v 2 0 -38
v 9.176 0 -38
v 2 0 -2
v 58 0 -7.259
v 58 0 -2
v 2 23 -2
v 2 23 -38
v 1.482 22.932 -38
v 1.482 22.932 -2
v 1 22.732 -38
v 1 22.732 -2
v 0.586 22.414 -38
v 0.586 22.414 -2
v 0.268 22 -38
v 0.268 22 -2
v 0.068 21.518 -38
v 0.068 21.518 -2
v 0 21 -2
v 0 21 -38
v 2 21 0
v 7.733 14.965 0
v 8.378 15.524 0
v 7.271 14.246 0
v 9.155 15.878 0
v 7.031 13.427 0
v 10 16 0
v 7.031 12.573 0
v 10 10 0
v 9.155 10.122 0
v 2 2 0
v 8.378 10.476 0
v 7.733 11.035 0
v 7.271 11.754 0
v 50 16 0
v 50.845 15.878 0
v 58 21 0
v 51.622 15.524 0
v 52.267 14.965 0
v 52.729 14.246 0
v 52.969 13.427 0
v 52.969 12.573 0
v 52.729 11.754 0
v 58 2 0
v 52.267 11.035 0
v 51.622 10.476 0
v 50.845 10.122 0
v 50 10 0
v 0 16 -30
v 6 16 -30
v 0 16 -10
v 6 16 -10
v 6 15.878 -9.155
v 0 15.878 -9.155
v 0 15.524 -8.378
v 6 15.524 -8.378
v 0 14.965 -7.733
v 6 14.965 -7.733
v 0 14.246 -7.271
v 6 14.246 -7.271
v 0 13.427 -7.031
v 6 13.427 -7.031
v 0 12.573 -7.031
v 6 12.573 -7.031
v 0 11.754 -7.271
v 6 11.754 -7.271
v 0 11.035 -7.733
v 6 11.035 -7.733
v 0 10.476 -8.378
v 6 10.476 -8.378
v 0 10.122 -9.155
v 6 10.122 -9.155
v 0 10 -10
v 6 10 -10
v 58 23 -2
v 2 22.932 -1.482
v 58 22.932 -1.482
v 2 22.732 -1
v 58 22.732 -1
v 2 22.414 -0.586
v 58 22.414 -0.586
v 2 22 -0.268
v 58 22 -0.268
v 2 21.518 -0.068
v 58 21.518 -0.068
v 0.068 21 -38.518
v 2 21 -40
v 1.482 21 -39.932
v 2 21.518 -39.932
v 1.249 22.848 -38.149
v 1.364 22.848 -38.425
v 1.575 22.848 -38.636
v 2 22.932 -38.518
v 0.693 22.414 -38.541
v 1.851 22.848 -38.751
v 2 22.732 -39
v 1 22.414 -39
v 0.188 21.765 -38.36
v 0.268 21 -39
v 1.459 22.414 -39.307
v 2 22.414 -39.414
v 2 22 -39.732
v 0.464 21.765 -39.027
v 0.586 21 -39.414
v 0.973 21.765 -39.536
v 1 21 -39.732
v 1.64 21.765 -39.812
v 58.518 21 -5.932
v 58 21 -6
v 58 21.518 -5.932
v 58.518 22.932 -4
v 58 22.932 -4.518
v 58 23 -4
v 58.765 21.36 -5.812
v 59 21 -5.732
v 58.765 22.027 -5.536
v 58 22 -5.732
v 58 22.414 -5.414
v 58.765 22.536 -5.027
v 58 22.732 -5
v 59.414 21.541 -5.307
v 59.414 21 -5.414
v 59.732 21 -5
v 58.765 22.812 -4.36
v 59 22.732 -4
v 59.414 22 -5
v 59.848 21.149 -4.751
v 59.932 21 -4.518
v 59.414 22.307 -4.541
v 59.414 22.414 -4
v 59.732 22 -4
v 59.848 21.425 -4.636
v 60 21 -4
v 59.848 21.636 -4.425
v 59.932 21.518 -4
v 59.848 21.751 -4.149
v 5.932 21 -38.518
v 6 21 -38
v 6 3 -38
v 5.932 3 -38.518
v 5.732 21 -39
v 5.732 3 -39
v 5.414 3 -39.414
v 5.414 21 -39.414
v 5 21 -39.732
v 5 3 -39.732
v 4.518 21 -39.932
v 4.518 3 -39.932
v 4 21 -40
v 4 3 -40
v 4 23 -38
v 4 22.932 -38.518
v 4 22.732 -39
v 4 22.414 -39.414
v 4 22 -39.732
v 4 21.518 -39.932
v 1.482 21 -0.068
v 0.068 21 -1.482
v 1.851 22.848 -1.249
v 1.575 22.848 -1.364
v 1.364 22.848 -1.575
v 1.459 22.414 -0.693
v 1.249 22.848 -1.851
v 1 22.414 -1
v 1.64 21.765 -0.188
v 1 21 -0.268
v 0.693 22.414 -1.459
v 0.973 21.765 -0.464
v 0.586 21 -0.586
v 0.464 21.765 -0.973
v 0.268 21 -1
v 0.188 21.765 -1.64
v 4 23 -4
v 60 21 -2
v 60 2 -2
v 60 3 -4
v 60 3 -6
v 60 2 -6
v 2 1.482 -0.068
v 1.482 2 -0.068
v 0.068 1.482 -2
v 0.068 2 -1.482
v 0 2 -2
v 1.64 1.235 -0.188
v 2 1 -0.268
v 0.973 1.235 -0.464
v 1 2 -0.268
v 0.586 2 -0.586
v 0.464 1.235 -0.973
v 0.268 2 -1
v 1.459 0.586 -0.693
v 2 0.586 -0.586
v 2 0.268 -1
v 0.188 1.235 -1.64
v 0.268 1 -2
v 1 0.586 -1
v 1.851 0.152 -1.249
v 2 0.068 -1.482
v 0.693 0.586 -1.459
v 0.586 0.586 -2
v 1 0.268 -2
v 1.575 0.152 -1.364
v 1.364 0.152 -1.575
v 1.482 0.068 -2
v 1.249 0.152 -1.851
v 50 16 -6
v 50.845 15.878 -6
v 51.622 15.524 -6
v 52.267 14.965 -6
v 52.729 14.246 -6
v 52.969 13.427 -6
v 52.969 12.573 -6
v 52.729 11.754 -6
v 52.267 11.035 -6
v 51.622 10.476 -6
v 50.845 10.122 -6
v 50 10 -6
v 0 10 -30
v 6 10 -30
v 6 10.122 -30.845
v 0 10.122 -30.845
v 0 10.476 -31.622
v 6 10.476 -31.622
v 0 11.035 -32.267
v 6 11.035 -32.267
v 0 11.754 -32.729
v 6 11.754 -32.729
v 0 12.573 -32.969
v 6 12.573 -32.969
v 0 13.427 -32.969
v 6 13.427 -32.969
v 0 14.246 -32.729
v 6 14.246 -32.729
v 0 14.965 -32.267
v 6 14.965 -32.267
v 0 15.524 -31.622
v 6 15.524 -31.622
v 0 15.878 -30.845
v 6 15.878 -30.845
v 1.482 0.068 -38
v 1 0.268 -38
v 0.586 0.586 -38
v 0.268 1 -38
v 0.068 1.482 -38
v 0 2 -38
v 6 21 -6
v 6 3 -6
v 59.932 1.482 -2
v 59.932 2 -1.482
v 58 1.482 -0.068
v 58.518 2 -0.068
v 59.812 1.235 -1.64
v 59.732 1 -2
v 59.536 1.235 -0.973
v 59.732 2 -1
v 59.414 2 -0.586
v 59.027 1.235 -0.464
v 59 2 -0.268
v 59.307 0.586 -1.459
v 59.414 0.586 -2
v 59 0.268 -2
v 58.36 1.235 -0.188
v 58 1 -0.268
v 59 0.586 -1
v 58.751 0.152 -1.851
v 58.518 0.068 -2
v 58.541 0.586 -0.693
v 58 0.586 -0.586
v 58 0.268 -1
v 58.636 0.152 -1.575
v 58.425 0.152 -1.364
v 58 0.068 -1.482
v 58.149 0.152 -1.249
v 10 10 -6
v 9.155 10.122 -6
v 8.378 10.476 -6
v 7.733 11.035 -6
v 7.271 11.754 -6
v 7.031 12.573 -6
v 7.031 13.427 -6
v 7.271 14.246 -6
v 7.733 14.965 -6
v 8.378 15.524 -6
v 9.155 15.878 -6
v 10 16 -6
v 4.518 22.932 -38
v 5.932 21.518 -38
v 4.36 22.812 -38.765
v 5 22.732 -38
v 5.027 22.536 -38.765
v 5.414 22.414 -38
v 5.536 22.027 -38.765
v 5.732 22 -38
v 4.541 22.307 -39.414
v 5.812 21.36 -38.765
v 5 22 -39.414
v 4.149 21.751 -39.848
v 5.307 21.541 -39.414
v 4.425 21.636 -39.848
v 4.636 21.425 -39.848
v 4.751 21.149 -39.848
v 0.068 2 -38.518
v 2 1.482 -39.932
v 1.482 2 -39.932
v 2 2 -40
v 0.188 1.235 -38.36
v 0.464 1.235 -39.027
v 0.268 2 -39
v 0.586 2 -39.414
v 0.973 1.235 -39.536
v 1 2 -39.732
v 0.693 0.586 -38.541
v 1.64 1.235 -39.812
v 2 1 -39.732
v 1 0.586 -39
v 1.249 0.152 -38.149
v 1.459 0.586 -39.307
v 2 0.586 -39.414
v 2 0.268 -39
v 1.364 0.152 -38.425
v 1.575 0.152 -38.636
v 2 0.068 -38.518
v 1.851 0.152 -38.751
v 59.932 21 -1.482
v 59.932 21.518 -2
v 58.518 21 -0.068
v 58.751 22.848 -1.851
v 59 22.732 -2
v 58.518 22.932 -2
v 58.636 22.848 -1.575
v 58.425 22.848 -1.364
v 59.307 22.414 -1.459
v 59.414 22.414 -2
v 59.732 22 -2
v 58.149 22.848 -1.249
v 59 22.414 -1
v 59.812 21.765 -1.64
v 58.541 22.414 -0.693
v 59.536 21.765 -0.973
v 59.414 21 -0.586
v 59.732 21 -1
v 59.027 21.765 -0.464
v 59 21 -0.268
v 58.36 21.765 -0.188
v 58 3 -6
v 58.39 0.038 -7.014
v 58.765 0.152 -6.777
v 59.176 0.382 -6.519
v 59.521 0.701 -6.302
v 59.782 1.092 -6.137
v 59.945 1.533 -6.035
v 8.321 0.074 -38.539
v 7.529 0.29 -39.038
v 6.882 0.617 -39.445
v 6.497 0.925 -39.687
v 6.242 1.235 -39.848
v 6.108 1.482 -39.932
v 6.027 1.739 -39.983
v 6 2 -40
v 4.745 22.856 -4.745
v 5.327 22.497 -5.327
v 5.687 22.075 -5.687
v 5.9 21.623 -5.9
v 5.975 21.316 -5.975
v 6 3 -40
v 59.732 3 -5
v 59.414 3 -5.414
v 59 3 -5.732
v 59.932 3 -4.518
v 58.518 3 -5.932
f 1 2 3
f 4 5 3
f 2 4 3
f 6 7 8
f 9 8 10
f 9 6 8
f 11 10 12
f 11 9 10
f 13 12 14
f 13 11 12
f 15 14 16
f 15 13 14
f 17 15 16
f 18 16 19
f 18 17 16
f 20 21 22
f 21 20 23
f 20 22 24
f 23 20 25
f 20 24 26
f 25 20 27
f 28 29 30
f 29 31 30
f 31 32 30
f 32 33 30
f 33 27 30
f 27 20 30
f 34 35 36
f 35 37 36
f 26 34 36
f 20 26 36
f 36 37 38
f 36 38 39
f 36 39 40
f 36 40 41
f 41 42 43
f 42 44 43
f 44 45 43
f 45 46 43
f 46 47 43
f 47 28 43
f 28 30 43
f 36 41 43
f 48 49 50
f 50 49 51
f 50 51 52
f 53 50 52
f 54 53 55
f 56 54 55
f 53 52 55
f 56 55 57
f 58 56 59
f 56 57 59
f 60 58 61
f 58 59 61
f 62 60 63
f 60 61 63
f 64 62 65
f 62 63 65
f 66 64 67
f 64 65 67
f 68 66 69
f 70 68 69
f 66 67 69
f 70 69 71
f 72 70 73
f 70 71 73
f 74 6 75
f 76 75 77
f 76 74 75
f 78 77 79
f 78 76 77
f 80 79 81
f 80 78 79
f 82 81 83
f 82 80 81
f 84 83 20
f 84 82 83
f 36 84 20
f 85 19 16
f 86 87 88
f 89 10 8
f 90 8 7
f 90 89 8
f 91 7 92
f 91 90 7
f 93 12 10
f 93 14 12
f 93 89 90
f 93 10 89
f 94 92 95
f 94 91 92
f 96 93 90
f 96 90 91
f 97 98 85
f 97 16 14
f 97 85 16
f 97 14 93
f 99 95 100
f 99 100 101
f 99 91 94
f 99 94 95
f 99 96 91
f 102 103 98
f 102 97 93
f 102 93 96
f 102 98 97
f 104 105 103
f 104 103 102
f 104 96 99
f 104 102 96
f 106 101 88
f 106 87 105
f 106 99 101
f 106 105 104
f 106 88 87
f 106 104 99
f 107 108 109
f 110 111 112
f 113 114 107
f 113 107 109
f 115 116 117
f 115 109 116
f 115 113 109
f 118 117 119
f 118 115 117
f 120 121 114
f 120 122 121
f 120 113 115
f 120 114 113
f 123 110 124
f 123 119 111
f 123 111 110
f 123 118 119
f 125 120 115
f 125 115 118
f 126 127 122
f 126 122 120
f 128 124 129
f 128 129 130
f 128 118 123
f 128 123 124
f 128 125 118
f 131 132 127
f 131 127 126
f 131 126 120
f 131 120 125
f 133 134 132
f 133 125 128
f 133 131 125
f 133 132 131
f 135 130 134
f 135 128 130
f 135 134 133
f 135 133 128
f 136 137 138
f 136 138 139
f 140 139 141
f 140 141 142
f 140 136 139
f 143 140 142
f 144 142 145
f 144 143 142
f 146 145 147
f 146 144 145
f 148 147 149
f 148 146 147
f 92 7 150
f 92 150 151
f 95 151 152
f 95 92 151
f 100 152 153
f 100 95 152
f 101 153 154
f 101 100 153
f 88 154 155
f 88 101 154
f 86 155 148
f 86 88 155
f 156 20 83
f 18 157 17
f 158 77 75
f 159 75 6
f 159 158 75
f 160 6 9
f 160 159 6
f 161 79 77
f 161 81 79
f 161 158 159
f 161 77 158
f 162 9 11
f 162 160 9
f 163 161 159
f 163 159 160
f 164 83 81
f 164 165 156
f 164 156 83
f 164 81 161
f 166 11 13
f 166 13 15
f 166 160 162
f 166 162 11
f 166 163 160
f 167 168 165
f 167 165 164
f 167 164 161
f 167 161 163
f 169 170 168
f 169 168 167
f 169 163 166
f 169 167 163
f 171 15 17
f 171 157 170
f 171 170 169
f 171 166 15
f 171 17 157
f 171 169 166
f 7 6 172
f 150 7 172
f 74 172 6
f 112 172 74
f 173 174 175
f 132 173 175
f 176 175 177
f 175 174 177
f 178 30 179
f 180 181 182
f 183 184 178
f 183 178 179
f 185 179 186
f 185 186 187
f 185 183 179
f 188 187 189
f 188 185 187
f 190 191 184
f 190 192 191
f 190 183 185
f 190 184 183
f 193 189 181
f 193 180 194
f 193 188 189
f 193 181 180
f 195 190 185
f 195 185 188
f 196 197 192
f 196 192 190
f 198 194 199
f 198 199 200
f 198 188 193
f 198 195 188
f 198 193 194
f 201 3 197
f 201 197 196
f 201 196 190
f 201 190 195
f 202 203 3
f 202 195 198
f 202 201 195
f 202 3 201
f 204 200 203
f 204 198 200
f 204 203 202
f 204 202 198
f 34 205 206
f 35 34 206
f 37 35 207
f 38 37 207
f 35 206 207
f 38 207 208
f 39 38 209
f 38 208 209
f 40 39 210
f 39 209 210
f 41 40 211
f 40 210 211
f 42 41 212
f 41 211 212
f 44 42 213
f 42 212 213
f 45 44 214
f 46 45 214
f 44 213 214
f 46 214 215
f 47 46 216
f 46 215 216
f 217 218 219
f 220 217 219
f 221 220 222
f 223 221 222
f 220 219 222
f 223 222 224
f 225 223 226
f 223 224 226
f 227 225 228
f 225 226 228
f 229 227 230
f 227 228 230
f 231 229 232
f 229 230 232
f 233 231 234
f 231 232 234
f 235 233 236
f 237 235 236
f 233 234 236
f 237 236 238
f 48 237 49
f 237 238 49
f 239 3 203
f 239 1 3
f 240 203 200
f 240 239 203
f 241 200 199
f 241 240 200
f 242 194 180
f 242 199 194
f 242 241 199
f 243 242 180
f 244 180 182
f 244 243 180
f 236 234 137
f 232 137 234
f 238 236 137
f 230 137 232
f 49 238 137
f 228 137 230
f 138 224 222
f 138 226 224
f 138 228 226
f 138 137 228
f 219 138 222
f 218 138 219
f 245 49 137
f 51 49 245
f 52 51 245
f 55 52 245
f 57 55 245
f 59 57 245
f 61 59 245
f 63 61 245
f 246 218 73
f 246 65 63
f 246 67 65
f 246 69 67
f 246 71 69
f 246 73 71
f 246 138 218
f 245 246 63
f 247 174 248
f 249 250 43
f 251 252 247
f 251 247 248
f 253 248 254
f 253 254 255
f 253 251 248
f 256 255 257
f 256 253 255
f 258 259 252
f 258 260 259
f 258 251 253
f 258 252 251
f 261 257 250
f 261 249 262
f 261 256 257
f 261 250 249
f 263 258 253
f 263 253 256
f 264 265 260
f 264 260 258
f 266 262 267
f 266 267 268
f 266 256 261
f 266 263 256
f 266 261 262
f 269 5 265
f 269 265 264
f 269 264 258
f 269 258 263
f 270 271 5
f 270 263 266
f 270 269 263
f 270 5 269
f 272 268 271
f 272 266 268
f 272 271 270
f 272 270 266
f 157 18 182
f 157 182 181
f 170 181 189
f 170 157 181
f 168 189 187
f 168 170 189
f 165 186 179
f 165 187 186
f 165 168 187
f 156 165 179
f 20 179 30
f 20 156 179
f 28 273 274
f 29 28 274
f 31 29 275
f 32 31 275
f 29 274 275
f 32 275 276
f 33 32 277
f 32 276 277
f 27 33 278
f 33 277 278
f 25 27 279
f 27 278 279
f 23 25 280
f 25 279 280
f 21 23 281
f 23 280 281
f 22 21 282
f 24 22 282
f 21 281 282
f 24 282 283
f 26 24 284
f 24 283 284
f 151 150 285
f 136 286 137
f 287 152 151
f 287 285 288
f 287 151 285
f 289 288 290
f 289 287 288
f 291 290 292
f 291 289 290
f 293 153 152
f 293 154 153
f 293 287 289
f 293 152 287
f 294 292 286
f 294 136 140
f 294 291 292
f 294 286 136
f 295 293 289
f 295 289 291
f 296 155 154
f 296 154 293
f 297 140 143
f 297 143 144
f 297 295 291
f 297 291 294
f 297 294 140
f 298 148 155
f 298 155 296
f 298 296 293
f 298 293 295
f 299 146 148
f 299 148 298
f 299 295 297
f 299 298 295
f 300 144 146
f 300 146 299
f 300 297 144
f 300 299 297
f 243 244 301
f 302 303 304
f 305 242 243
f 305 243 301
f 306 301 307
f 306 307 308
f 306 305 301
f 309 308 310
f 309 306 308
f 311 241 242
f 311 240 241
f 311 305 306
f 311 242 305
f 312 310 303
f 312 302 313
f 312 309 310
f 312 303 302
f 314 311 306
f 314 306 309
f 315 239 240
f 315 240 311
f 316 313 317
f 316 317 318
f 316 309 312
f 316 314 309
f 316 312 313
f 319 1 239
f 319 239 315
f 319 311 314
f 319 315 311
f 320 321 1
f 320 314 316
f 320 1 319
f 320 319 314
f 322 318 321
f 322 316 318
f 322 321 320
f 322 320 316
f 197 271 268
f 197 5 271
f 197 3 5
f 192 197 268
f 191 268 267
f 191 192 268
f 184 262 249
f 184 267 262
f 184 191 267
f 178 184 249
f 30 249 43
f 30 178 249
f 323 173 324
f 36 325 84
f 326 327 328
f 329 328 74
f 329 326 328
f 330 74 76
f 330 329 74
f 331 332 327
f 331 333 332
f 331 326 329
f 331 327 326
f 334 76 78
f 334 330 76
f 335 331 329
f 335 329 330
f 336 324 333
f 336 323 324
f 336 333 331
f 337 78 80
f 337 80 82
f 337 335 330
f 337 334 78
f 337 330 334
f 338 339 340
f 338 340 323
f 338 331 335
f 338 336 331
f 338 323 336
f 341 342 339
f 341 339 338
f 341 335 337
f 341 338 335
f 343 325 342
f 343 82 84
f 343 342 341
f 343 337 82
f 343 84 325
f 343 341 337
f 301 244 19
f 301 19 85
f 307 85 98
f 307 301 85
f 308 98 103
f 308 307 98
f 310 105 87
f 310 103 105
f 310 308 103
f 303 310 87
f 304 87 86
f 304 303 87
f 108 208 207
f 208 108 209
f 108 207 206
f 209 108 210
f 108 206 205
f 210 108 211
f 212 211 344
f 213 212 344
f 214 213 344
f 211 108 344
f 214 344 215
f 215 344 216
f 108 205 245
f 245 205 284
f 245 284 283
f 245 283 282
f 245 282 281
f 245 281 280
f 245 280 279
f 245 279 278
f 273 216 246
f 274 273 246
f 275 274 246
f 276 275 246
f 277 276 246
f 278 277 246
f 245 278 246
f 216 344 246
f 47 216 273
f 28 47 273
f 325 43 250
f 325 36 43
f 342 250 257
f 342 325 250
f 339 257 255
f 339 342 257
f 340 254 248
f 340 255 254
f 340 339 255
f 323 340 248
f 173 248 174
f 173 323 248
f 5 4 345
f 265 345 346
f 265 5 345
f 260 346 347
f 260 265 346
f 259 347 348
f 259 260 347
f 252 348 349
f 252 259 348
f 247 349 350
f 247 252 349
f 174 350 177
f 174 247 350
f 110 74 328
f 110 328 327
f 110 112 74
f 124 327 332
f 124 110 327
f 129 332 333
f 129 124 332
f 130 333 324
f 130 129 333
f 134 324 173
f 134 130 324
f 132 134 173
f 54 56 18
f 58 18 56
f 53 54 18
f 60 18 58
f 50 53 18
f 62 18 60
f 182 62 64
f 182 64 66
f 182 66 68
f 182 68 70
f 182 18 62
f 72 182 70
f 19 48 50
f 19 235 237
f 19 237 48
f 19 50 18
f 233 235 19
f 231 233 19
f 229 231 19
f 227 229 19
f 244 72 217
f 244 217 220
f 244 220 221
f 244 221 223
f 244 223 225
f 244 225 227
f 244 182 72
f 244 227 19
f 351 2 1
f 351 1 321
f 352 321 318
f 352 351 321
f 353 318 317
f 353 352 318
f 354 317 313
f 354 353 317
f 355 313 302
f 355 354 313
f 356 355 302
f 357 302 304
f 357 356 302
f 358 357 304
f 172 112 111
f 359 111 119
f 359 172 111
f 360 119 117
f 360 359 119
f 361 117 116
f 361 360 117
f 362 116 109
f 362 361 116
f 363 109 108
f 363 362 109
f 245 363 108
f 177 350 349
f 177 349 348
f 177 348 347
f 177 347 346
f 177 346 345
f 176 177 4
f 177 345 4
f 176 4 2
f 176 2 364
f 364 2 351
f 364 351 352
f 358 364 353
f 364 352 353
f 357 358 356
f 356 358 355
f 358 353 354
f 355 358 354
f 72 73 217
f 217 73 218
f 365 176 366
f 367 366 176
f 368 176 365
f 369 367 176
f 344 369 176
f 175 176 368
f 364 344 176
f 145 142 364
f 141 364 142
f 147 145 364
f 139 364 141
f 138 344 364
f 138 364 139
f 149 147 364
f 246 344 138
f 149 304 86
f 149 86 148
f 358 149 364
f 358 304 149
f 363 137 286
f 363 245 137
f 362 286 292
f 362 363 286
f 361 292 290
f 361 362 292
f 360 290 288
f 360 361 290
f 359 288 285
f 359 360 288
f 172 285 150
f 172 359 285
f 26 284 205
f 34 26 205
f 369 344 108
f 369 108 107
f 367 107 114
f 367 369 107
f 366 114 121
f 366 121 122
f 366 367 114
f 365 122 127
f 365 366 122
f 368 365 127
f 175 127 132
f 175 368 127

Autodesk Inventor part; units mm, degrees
ref_plane "YZ Plane" through (0, 0, 0) normal (1, 0, 0) x (0, 1, 0)
ref_plane "XZ Plane" through (0, 0, 0) normal (0, 1, 0) x (-1, 0, 0)
ref_plane "XY Plane" through (0, 0, 0) normal (0, 0, 1) x (1, 0, 0)
sketch "Sketch1" plane through (0, 0, 0) normal (0, 1, 0) x (-1, 0, 0)
  line L0 (0, 0) -> (0, -40)
  line L1 (0, 0) -> (40, 0) construction
  line L2 (0, 0) -> (-60, 0)
  line L3 (-6, -40) -> (-6, -6)
  line L4 (-6, -6) -> (-60, -6)
  line L5 (-60, 0) -> (-60, -6)
  line L6 (0, -40) -> (-6, -40)
  line L7 (-60, -6) -> (-6, -40)
  dimension "d0" = 40
  dimension "d1" = 90
  dimension "d2" = 60
  dimension "d3" = 6
extrude "Extrusion1" add sketch "Sketch1" along normal blind 3
sketch "Sketch2" plane through (0, 3, 0) normal (0, 1, 0) x (1, 0, 0)
  line L0 (0, 40) -> (0, 0) projected
  line L1 (0, 0) -> (0, 40)
  line L2 (0, 0) -> (60, 0) projected
  line L3 (60, 0) -> (0, 0)
  line L4 (6, 40) -> (6, 0)
  line L5 (60, 6) -> (6, 6)
  line L6 (60, 6) -> (6, 40) projected
  line L7 (60, 6) -> (60, 0)
  line L8 (6, 40) -> (0, 40)
  dimension "d6" = 6
extrude "Extrusion2" add sketch "Sketch2" along normal blind 20 contours L8 L4 L2 L0 | L4 L5 L7 L2
sketch "Sketch3" plane through (6, 3, -6) normal (1, 0, 0) x (0, 0, -1)
  line L0 (34, 20) -> (-6, 20) projected
  line L1 (-6, 20) -> (4, 20)
  line L2 (4, 20) -> (4, 10)
  line L3 (4, 10) -> (24, 10) construction
  line L4 (4, 7) -> (24, 7)
  line L5 (24, 13) -> (4, 13)
  arc A0 (4, 13) -> (4, 7) centre (4, 10) ccw
  arc A1 (24, 7) -> (24, 13) centre (24, 10) ccw
  point P0 (-6, -3)
  point P1 (14, 10)
  dimension "d9" = 10
  dimension "d10" = 10
  dimension "d11" = 20
  dimension "d12" = 6
extrude "Extrusion3" cut sketch "Sketch3" against normal blind 20
sketch "Sketch4" plane through (60, 3, -6) normal (0, 0, -1) x (-1, 0, 0)
  line L0 (10, 20) -> (10, 10)
  line L1 (10, 10) -> (50, 10) construction
  line L2 (10, 7) -> (50, 7)
  line L3 (50, 13) -> (10, 13)
  arc A0 (10, 13) -> (10, 7) centre (10, 10) ccw
  arc A1 (50, 7) -> (50, 13) centre (50, 10) ccw
  line L4 (60, -3) -> (60, 20) projected
  line L5 (0, 20) -> (54, 20) projected
  point P0 (30, 10)
  dimension "d16" = 10
  dimension "d17" = 40
  dimension "d18" = 6
  dimension "d35" = 10
  dimension "d36" = 13
extrude "Extrusion4" cut sketch "Sketch4" against normal blind 20
fillet "Fillet1" radius 2 3 edges at (0, 11.5, 0) (60, 11.5, 0) (0, 11.5, -40)
fillet "Fillet2" radius 2 2 edges at (33, 23, -6) (6, 23, -23)
fillet "Fillet3" radius 2 11 edges at (59.4142, 23, -0.5858) (60, 23, -3) (60, 22.4142, -5.4142) (60, 12, -6) (0.5858, 23, -0.5858) (0, 23, -20) (0.5858, 23, -39.4142) (3, 23, -40) (5.4142, 22.4142, -40) (6, 12, -40) (30, 23, 0)
fillet "Fillet4" radius 2 7 edges at (0.5858, 0, -39.4142) (4, 0, -40) (0.5858, 0, -0.5858) (30, 0, 0) (59.4142, 0, -0.5858) (60, 0, -4) (0, 0, -20)
properties part number "RightAngle_Bracket_60mm"
